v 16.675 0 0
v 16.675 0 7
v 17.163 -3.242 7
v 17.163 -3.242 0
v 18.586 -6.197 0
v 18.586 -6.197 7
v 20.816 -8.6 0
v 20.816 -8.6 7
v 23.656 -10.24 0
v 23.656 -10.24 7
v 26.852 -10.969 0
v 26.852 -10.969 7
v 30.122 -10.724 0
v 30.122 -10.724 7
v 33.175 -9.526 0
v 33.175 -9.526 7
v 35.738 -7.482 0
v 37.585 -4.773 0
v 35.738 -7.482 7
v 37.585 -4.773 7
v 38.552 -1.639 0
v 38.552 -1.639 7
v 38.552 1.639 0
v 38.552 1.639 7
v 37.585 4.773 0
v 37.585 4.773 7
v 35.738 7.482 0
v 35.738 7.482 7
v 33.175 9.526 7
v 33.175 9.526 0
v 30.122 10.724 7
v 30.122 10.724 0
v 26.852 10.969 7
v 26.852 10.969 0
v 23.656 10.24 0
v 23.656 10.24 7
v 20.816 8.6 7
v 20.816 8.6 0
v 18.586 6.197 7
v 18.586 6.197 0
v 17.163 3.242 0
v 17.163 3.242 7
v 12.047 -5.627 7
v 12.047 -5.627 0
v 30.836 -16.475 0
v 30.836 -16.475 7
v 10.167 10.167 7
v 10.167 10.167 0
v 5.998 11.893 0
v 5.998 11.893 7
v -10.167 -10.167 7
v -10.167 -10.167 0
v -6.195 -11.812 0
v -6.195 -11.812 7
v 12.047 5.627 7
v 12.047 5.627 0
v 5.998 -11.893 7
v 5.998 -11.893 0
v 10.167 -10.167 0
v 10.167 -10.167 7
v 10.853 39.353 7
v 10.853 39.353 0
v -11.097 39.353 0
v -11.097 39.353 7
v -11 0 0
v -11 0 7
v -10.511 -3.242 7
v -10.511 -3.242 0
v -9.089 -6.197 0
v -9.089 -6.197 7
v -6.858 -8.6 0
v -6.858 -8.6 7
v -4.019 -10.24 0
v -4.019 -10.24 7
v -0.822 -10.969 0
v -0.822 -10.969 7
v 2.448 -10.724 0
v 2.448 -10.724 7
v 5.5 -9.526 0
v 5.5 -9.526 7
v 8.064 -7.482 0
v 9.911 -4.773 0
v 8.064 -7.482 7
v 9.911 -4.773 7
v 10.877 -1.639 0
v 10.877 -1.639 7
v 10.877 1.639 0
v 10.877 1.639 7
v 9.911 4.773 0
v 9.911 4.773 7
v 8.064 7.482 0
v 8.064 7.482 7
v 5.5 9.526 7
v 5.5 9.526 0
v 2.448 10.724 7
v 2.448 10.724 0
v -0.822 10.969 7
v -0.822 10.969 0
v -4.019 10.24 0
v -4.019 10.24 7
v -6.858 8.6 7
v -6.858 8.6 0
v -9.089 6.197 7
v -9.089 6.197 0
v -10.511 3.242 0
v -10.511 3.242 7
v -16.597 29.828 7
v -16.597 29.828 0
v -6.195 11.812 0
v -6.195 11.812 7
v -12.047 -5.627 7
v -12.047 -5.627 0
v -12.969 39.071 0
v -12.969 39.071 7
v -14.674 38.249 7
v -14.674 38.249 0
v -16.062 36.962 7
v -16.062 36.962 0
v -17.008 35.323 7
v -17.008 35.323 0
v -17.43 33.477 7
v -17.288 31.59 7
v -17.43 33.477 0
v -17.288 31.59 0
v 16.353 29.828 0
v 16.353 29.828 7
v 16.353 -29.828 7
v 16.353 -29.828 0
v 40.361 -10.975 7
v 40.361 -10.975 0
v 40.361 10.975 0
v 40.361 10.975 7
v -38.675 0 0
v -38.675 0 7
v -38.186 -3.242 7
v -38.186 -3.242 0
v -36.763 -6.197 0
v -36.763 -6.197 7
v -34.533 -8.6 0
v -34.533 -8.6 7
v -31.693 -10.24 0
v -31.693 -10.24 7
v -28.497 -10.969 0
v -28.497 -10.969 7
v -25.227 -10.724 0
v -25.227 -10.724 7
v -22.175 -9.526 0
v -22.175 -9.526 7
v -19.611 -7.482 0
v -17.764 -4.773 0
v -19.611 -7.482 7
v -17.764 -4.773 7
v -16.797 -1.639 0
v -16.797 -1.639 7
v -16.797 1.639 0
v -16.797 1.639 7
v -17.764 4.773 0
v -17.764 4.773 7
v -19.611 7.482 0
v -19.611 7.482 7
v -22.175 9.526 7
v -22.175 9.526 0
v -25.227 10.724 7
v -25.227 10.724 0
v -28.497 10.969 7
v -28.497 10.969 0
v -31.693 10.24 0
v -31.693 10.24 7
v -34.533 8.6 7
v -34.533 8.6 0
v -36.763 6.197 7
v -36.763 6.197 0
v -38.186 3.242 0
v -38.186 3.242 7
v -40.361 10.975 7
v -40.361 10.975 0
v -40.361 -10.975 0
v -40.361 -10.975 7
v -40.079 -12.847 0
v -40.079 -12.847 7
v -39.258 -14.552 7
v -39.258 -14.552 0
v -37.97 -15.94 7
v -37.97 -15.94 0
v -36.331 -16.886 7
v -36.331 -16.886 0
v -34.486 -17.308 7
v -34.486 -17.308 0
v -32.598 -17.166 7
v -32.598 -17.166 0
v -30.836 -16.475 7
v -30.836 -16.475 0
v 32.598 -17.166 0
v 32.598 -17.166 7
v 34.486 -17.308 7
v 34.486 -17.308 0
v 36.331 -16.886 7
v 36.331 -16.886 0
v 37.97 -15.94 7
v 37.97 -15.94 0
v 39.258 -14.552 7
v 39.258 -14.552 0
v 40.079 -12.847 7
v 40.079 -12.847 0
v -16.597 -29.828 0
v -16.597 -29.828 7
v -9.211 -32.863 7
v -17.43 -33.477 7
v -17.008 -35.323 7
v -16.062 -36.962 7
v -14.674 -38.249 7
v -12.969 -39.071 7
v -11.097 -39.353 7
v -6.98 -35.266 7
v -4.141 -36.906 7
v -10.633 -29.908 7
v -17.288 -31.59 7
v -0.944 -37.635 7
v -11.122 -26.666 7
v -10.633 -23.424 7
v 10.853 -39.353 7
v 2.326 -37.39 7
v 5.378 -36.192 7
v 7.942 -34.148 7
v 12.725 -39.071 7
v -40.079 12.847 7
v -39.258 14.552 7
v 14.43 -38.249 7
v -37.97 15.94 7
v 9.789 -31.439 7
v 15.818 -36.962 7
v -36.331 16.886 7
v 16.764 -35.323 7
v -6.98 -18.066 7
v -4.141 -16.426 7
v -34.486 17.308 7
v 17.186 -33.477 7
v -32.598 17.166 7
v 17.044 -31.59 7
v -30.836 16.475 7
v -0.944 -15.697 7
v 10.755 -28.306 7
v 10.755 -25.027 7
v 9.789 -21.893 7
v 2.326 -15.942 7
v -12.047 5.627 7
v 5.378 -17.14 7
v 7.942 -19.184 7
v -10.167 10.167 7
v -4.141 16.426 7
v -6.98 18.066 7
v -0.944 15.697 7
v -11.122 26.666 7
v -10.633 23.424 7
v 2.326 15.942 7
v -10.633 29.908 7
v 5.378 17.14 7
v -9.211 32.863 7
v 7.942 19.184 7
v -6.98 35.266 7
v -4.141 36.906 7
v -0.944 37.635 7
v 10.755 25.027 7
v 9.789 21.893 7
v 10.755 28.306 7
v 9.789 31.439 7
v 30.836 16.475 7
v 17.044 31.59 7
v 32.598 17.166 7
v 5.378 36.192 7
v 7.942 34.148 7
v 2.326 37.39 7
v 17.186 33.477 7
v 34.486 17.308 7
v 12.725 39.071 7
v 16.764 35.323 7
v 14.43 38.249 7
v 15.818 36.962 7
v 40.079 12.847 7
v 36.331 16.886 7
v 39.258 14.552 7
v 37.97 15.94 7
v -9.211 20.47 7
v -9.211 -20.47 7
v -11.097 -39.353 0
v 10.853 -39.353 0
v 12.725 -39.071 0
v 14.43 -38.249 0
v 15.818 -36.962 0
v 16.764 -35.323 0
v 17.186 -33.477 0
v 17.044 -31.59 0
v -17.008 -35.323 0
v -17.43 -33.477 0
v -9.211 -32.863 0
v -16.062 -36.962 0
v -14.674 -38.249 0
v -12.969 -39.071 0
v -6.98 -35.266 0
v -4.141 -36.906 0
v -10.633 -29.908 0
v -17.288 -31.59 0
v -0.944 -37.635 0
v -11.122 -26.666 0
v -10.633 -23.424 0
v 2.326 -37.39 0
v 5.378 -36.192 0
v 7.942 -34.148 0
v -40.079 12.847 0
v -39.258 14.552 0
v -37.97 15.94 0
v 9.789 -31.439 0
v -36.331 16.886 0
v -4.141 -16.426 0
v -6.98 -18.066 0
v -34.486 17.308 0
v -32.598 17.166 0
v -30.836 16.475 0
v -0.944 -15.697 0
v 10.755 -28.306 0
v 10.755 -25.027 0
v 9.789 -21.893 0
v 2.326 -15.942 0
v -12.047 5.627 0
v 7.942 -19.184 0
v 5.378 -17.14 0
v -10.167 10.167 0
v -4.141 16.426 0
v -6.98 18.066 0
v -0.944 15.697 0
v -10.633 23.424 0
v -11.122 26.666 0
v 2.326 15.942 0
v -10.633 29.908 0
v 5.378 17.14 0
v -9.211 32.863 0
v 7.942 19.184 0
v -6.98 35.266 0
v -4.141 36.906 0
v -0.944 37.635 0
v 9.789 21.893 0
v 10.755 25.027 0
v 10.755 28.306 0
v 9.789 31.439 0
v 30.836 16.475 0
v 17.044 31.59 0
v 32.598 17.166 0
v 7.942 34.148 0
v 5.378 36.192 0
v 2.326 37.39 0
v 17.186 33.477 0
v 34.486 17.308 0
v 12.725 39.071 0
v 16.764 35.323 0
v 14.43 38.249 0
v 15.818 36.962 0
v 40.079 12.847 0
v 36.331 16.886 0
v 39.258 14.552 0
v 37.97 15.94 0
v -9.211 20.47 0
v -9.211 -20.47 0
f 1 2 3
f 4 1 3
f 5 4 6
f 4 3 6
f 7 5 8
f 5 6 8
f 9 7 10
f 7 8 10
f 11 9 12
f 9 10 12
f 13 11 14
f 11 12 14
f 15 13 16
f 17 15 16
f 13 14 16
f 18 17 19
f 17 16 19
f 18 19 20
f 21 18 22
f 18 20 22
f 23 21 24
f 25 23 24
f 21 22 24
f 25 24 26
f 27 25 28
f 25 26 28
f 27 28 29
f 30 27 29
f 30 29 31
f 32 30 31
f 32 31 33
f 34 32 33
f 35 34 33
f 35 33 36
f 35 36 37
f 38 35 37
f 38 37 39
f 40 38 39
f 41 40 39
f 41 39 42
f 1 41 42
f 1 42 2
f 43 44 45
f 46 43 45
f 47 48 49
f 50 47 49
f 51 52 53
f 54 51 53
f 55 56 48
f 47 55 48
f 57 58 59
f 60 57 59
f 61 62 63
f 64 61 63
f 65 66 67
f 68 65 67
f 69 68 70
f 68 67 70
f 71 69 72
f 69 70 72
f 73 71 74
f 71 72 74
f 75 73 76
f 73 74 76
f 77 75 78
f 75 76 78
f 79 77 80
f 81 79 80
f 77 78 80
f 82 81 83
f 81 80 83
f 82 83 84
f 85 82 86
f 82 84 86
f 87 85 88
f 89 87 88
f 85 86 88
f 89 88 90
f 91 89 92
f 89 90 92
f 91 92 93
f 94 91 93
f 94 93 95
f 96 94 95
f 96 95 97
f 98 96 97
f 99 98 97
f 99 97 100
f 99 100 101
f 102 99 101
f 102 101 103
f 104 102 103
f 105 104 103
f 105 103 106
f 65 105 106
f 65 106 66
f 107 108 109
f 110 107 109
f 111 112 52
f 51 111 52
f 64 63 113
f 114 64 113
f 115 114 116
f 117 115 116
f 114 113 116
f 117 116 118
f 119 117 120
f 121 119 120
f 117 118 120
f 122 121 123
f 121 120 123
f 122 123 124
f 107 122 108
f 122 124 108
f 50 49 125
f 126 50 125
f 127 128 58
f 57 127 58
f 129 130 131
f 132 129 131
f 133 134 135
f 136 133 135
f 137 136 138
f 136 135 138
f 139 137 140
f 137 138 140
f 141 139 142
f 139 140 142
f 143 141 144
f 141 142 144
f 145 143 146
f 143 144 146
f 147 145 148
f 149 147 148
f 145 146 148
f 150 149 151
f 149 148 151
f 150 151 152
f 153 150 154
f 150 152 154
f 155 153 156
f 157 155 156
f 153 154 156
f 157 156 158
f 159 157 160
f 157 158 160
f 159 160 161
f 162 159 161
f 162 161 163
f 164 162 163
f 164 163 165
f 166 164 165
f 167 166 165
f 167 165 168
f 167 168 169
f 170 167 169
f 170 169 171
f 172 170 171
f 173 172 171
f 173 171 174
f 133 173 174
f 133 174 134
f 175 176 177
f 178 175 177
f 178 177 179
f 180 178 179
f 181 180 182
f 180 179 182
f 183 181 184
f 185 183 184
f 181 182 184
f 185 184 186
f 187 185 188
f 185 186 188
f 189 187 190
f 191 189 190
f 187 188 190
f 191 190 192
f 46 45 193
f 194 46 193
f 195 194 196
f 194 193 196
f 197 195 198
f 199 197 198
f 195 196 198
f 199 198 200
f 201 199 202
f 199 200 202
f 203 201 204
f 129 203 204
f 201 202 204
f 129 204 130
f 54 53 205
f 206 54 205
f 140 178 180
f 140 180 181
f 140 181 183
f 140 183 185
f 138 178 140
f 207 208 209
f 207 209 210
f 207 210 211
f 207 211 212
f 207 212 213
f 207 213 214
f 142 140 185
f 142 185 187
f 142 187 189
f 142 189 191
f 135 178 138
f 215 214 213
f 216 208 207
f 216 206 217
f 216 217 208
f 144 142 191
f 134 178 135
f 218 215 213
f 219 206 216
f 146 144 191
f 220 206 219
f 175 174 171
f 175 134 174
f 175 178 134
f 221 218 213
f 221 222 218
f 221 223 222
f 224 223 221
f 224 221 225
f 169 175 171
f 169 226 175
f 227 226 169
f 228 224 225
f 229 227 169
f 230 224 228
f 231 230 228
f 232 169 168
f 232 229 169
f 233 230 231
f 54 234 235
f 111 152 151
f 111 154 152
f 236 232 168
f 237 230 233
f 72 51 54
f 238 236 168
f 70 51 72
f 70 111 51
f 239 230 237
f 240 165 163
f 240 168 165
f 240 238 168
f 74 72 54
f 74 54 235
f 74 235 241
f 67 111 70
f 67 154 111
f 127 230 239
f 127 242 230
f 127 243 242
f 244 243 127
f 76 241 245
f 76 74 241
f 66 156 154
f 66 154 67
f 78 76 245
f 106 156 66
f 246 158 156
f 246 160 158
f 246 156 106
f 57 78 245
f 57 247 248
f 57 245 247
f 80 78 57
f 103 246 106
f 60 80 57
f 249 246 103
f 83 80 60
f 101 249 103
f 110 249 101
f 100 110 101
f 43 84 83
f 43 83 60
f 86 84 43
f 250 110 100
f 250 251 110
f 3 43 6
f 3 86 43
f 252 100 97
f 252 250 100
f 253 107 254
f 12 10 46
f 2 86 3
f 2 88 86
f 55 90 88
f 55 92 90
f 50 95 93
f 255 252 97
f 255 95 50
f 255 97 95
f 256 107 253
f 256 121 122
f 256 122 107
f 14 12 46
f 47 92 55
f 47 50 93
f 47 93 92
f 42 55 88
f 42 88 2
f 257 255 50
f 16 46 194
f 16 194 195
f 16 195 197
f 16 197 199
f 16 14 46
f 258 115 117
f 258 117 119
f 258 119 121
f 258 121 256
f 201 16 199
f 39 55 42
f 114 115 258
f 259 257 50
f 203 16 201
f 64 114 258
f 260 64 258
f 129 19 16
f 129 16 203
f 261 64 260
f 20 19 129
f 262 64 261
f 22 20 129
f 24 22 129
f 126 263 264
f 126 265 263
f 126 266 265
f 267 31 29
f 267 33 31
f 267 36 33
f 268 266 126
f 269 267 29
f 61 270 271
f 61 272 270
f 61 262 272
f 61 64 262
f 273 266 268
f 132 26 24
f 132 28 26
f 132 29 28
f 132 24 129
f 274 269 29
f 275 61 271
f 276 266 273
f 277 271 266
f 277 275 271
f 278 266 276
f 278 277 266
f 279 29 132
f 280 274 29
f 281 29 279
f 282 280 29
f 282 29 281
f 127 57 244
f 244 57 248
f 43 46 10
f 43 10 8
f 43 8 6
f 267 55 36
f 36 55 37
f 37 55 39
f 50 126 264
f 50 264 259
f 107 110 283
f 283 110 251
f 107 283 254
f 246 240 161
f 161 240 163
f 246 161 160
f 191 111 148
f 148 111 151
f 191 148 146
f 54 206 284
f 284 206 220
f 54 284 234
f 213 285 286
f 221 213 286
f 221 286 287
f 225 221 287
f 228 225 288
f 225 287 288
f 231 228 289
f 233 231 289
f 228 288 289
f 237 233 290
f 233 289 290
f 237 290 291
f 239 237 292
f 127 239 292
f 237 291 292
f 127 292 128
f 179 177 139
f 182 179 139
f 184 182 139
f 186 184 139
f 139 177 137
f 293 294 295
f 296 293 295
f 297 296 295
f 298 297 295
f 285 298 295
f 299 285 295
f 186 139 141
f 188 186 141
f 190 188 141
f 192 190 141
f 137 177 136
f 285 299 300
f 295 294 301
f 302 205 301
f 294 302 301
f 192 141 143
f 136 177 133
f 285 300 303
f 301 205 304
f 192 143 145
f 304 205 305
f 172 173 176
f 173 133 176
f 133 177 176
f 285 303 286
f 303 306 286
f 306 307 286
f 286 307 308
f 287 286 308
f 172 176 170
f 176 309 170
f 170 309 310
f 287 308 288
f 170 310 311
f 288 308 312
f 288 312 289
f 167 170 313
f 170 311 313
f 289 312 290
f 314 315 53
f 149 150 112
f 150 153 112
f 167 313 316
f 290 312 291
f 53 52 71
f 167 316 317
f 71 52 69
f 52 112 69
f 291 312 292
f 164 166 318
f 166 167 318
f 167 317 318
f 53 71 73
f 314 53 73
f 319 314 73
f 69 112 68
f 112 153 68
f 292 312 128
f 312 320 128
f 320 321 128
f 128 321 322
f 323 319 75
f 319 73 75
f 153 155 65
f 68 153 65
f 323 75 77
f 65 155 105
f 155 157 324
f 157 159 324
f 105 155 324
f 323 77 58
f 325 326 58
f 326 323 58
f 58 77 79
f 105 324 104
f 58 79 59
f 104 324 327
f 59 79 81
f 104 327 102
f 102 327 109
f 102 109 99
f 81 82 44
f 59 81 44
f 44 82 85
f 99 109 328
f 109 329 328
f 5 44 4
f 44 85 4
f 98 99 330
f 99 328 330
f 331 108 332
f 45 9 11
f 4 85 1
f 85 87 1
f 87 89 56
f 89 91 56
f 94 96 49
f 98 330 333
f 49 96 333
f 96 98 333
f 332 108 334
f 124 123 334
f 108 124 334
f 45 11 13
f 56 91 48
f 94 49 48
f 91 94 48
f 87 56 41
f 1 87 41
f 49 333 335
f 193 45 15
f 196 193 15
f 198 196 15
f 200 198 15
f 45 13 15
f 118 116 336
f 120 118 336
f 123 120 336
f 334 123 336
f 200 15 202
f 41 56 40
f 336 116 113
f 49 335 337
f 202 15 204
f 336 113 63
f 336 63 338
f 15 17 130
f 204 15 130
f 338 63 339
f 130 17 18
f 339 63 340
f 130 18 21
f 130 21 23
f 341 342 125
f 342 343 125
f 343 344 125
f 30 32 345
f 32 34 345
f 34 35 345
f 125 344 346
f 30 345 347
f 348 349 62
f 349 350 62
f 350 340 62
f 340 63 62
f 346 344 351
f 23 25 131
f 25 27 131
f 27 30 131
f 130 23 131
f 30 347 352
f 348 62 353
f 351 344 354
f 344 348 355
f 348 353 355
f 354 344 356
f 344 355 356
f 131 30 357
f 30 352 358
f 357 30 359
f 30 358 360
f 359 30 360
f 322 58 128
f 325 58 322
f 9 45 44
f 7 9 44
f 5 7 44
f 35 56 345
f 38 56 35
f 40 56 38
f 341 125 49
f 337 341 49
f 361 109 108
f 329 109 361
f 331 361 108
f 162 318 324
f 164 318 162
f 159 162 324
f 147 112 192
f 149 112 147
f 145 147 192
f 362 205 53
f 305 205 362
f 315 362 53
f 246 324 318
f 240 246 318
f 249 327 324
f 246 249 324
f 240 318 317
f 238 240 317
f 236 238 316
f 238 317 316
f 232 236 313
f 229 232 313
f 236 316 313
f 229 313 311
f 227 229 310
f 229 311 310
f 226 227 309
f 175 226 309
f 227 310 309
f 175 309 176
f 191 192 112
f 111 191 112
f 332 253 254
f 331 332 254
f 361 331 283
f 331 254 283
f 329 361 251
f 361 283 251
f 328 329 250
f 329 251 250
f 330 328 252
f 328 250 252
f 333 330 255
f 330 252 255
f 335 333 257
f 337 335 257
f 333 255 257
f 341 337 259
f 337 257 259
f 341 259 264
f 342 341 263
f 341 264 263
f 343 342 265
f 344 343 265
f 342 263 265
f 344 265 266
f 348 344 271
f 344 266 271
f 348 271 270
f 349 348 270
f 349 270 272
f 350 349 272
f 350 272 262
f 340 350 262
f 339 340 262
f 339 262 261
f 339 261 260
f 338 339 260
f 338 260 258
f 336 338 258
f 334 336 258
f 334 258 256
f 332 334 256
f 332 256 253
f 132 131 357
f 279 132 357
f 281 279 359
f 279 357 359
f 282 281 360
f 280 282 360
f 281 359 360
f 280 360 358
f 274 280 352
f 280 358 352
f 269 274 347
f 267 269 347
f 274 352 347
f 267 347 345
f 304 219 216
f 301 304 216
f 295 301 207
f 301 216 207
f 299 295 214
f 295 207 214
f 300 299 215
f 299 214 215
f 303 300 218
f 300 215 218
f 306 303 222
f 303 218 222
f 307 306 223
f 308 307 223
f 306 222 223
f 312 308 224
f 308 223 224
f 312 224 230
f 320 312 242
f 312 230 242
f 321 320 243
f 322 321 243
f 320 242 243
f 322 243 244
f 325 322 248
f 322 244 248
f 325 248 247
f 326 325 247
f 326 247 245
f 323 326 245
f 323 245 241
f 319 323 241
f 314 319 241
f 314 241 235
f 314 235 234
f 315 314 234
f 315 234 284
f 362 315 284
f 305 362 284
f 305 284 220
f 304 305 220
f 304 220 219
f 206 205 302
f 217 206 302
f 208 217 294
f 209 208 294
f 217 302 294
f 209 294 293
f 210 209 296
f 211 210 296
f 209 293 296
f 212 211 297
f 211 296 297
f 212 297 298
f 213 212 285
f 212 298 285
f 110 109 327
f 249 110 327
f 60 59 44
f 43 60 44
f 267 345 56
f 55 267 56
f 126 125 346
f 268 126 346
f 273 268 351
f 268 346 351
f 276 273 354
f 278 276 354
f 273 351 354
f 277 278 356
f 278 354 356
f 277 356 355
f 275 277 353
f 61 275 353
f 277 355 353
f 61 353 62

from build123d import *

# Parameters (mm, degrees)
F0_R     = 11
F1_DEPTH = 7
F2_D     = 22


with BuildPart() as f1:
    # F0 (on Top) → F1 (new body)
    with BuildSketch(Plane.XY):
        with BuildLine():
            Line((16.352598, -29.827668), (5.998279, -11.893462))
            Line((5.998279, -11.893462), (4.426611, -12.544469))
            Line((4.426611, -12.544469), (13.431306, -28.141059))
            ThreePointArc((13.431306, -28.141059), (13.431306, -34.491059), (7.932045, -37.666059))
            Line((7.932045, -37.666059), (-8.176027, -37.666059))
            ThreePointArc((-8.176027, -37.666059), (-13.675289, -34.491059), (-13.675289, -28.141059))
            Line((-13.675289, -28.141059), (-4.623506, -12.462912))
            Line((-4.623506, -12.462912), (-6.195175, -11.811905))
            Line((-6.195175, -11.811905), (-16.59658, -29.827668))
            ThreePointArc((-16.59658, -29.827668), (-16.59658, -36.177668), (-11.097319, -39.352668))
            Line((-11.097319, -39.352668), (10.853336, -39.352668))
            ThreePointArc((10.853336, -39.352668), (16.352598, -36.177668), (16.352598, -29.827668))
        make_face()
        with BuildLine():
            Line((30.836118, 16.474589), (12.047307, 5.626864))
            Line((12.047307, 5.626864), (12.698314, 4.055195))
            Line((12.698314, 4.055195), (14.378031, 0))
            Line((14.378031, 0), (12.698314, -4.055195))
            Line((12.698314, -4.055195), (12.047307, -5.626864))
            Line((12.047307, -5.626864), (30.836118, -16.474589))
            ThreePointArc((30.836118, -16.474589), (37.186118, -16.474589), (40.361118, -10.975328))
            Line((40.361118, -10.975328), (40.361118, 10.975328))
            ThreePointArc((40.361118, 10.975328), (37.186118, 16.474589), (30.836118, 16.474589))
        make_face()
        with BuildLine():
            Line((-12.698314, 4.055195), (-12.047307, 5.626864))
            Line((-12.047307, 5.626864), (-30.836118, 16.474589))
            ThreePointArc((-30.836118, 16.474589), (-37.186118, 16.474589), (-40.361118, 10.975328))
            Line((-40.361118, 10.975328), (-40.361118, -10.975328))
            ThreePointArc((-40.361118, -10.975328), (-37.186118, -16.474589), (-30.836118, -16.474589))
            Line((-30.836118, -16.474589), (-12.047307, -5.626864))
            Line((-12.047307, -5.626864), (-12.698314, -4.055195))
            Line((-12.698314, -4.055195), (-29.149509, -13.553298))
            ThreePointArc((-29.149509, -13.553298), (-35.499509, -13.553298), (-38.674509, -8.054036))
            Line((-38.674509, -8.054036), (-38.674509, 8.054036))
            ThreePointArc((-38.674509, 8.054036), (-35.499509, 13.553298), (-29.149509, 13.553298))
            Line((-29.149509, 13.553298), (-12.698314, 4.055195))
        make_face()
        with BuildLine():
            Line((13.431306, -28.141059), (4.426611, -12.544469))
            Line((4.426611, -12.544469), (0, -14.378031))
            Line((0, -14.378031), (-4.623506, -12.462912))
            Line((-4.623506, -12.462912), (-13.675289, -28.141059))
            ThreePointArc((-13.675289, -28.141059), (-13.675289, -34.491059), (-8.176027, -37.666059))
            Line((-8.176027, -37.666059), (7.932045, -37.666059))
            ThreePointArc((7.932045, -37.666059), (13.431306, -34.491059), (13.431306, -28.141059))
        make_face()
        Polygon((5.998279, 11.893462), (0, 14.378031), (-6.195175, 11.811905), (-10.166803, 10.166803), (-12.047307, 5.626864), (-12.698314, 4.055195), (-14.378031, 0), (-12.698314, -4.055195), (-12.047307, -5.626864), (-10.166803, -10.166803), (-6.195175, -11.811905), (-4.623506, -12.462912), (0, -14.378031), (4.426611, -12.544469), (5.998279, -11.893462), (10.166803, -10.166803), (12.047307, -5.626864), (12.698314, -4.055195), (14.378031, 0), (12.698314, 4.055195), (12.047307, 5.626864), (10.166803, 10.166803), align=None)
        Circle(F0_R, mode=Mode.SUBTRACT)
        with BuildLine():
            Line((-6.195175, 11.811905), (0, 14.378031))
            Line((0, 14.378031), (5.998279, 11.893462))
            Line((5.998279, 11.893462), (16.352598, 29.827668))
            ThreePointArc((16.352598, 29.827668), (16.352598, 36.177668), (10.853336, 39.352668))
            Line((10.853336, 39.352668), (-11.097319, 39.352668))
            ThreePointArc((-11.097319, 39.352668), (-16.59658, 36.177668), (-16.59658, 29.827668))
            Line((-16.59658, 29.827668), (-6.195175, 11.811905))
        make_face()
        with BuildLine():
            Line((-14.378031, 0), (-12.698314, 4.055195))
            Line((-12.698314, 4.055195), (-29.149509, 13.553298))
            ThreePointArc((-29.149509, 13.553298), (-35.499509, 13.553298), (-38.674509, 8.054036))
            Line((-38.674509, 8.054036), (-38.674509, -8.054036))
            ThreePointArc((-38.674509, -8.054036), (-35.499509, -13.553298), (-29.149509, -13.553298))
            Line((-29.149509, -13.553298), (-12.698314, -4.055195))
            Line((-12.698314, -4.055195), (-14.378031, 0))
        make_face()
        Circle(F0_R)
    extrude(amount=F1_DEPTH)

    # F2 (through all)
    with Locations(Plane(origin=(0, 0, 0), x_dir=(1, 0, 0), z_dir=(0, 0, -1))):
        with Locations((-27.674509, 0), (-0.121991, -26.666059), (0, 0), (27.674509, 0), (-0.121991, 26.666059)):
            Hole(F2_D / 2)


solid = f1.part
